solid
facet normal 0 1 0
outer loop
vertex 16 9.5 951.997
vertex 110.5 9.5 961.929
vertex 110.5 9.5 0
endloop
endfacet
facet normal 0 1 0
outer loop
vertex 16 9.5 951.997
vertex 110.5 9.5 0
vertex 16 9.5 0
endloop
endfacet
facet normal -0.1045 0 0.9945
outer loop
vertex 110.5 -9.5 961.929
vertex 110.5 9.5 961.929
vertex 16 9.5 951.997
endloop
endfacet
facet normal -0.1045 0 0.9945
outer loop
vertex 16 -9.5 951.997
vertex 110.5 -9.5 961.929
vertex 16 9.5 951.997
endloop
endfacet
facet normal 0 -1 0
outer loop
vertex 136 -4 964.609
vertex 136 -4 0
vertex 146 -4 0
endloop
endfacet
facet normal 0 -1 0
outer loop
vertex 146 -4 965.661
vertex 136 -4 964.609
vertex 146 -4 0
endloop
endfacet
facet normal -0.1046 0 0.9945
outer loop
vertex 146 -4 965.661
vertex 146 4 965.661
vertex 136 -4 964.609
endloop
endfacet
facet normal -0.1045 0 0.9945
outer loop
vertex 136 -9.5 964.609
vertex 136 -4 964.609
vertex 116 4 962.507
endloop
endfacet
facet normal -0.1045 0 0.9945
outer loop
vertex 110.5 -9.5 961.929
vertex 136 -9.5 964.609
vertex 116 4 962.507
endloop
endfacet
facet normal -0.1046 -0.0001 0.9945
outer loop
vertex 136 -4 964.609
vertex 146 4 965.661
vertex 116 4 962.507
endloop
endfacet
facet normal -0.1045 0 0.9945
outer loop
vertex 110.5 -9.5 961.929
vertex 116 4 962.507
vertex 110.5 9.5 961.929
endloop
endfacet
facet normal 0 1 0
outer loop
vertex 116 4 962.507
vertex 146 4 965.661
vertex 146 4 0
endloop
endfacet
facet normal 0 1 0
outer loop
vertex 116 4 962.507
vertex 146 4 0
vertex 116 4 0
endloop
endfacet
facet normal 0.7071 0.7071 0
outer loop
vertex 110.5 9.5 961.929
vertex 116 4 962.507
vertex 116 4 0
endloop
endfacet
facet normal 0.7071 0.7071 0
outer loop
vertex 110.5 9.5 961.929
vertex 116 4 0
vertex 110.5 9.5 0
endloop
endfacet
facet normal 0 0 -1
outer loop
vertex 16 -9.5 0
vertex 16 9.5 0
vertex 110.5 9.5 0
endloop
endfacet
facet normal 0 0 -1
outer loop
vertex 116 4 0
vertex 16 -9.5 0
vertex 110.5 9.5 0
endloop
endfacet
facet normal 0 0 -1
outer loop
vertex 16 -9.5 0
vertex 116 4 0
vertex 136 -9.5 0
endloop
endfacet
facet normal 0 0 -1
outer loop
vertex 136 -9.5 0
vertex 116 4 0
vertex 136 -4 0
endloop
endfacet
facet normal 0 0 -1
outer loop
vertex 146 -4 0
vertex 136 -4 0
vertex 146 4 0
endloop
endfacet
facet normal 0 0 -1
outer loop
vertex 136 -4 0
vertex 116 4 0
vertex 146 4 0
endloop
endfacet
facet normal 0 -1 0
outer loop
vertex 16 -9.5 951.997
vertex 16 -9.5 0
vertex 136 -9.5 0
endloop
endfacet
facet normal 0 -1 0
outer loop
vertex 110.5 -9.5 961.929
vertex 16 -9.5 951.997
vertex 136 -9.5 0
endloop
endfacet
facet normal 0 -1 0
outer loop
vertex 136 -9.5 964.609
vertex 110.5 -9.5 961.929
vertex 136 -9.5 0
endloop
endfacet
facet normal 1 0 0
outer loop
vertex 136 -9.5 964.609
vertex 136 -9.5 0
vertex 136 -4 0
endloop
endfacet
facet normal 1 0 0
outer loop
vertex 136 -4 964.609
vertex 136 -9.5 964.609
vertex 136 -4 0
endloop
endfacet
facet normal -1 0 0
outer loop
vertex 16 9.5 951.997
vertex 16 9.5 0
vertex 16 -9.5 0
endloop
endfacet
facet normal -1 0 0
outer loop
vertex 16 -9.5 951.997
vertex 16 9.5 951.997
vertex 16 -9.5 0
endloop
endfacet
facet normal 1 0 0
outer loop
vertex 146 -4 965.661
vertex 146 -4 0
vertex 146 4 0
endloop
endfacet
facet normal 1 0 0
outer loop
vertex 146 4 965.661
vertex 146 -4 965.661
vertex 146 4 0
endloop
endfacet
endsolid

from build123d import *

# Parameters (mm, degrees)
F1_DEPTH = 1100
F3_DEPTH = 1100.001
F5_DEPTH = 19.001


with BuildPart() as f1:
    # F0 (on Top) → F1 (new body)
    with BuildSketch(Plane.XY):
        Polygon((0, -4), (0, -9.5), (136, -9.5), (136, -4), (146, -4), (146, 4), (116, 4), (110.5, 9.5), (0, 9.5), (0, 4), (12, 4), (12, -4), align=None)
    extrude(amount=F1_DEPTH)

    # F2 (on face) → F3 (cut, through all)
    with BuildSketch(Plane(origin=(0, 0, 0), x_dir=(1, 0, 0), z_dir=(0, 0, -1))):
        Polygon((0, -9.5), (16, -9.5), (16, 9.5), (0, 9.5), (0, 4), (12, 4), (12, -4), (0, -4), align=None)
    extrude(amount=-F3_DEPTH, mode=Mode.SUBTRACT)

    # F4 (on face) → F5 (cut, through all)
    with BuildSketch(Plane(origin=(0, 9.5, 0), x_dir=(-1, 0, 0), z_dir=(0, 1, 0))):
        Polygon((-110.5, 1100), (-1424.1546681334, 1100), (-110.5, 961.9293307027), align=None)
        Polygon((-16, 1100), (-16, 951.99698047), (3, 950), (3, 1100), align=None)
        Polygon((-110.5, 1100), (-110.5, 961.9293307027), (-16, 951.99698047), (-16, 1100), align=None)
    extrude(amount=-F5_DEPTH, mode=Mode.SUBTRACT)


solid = f1.part
